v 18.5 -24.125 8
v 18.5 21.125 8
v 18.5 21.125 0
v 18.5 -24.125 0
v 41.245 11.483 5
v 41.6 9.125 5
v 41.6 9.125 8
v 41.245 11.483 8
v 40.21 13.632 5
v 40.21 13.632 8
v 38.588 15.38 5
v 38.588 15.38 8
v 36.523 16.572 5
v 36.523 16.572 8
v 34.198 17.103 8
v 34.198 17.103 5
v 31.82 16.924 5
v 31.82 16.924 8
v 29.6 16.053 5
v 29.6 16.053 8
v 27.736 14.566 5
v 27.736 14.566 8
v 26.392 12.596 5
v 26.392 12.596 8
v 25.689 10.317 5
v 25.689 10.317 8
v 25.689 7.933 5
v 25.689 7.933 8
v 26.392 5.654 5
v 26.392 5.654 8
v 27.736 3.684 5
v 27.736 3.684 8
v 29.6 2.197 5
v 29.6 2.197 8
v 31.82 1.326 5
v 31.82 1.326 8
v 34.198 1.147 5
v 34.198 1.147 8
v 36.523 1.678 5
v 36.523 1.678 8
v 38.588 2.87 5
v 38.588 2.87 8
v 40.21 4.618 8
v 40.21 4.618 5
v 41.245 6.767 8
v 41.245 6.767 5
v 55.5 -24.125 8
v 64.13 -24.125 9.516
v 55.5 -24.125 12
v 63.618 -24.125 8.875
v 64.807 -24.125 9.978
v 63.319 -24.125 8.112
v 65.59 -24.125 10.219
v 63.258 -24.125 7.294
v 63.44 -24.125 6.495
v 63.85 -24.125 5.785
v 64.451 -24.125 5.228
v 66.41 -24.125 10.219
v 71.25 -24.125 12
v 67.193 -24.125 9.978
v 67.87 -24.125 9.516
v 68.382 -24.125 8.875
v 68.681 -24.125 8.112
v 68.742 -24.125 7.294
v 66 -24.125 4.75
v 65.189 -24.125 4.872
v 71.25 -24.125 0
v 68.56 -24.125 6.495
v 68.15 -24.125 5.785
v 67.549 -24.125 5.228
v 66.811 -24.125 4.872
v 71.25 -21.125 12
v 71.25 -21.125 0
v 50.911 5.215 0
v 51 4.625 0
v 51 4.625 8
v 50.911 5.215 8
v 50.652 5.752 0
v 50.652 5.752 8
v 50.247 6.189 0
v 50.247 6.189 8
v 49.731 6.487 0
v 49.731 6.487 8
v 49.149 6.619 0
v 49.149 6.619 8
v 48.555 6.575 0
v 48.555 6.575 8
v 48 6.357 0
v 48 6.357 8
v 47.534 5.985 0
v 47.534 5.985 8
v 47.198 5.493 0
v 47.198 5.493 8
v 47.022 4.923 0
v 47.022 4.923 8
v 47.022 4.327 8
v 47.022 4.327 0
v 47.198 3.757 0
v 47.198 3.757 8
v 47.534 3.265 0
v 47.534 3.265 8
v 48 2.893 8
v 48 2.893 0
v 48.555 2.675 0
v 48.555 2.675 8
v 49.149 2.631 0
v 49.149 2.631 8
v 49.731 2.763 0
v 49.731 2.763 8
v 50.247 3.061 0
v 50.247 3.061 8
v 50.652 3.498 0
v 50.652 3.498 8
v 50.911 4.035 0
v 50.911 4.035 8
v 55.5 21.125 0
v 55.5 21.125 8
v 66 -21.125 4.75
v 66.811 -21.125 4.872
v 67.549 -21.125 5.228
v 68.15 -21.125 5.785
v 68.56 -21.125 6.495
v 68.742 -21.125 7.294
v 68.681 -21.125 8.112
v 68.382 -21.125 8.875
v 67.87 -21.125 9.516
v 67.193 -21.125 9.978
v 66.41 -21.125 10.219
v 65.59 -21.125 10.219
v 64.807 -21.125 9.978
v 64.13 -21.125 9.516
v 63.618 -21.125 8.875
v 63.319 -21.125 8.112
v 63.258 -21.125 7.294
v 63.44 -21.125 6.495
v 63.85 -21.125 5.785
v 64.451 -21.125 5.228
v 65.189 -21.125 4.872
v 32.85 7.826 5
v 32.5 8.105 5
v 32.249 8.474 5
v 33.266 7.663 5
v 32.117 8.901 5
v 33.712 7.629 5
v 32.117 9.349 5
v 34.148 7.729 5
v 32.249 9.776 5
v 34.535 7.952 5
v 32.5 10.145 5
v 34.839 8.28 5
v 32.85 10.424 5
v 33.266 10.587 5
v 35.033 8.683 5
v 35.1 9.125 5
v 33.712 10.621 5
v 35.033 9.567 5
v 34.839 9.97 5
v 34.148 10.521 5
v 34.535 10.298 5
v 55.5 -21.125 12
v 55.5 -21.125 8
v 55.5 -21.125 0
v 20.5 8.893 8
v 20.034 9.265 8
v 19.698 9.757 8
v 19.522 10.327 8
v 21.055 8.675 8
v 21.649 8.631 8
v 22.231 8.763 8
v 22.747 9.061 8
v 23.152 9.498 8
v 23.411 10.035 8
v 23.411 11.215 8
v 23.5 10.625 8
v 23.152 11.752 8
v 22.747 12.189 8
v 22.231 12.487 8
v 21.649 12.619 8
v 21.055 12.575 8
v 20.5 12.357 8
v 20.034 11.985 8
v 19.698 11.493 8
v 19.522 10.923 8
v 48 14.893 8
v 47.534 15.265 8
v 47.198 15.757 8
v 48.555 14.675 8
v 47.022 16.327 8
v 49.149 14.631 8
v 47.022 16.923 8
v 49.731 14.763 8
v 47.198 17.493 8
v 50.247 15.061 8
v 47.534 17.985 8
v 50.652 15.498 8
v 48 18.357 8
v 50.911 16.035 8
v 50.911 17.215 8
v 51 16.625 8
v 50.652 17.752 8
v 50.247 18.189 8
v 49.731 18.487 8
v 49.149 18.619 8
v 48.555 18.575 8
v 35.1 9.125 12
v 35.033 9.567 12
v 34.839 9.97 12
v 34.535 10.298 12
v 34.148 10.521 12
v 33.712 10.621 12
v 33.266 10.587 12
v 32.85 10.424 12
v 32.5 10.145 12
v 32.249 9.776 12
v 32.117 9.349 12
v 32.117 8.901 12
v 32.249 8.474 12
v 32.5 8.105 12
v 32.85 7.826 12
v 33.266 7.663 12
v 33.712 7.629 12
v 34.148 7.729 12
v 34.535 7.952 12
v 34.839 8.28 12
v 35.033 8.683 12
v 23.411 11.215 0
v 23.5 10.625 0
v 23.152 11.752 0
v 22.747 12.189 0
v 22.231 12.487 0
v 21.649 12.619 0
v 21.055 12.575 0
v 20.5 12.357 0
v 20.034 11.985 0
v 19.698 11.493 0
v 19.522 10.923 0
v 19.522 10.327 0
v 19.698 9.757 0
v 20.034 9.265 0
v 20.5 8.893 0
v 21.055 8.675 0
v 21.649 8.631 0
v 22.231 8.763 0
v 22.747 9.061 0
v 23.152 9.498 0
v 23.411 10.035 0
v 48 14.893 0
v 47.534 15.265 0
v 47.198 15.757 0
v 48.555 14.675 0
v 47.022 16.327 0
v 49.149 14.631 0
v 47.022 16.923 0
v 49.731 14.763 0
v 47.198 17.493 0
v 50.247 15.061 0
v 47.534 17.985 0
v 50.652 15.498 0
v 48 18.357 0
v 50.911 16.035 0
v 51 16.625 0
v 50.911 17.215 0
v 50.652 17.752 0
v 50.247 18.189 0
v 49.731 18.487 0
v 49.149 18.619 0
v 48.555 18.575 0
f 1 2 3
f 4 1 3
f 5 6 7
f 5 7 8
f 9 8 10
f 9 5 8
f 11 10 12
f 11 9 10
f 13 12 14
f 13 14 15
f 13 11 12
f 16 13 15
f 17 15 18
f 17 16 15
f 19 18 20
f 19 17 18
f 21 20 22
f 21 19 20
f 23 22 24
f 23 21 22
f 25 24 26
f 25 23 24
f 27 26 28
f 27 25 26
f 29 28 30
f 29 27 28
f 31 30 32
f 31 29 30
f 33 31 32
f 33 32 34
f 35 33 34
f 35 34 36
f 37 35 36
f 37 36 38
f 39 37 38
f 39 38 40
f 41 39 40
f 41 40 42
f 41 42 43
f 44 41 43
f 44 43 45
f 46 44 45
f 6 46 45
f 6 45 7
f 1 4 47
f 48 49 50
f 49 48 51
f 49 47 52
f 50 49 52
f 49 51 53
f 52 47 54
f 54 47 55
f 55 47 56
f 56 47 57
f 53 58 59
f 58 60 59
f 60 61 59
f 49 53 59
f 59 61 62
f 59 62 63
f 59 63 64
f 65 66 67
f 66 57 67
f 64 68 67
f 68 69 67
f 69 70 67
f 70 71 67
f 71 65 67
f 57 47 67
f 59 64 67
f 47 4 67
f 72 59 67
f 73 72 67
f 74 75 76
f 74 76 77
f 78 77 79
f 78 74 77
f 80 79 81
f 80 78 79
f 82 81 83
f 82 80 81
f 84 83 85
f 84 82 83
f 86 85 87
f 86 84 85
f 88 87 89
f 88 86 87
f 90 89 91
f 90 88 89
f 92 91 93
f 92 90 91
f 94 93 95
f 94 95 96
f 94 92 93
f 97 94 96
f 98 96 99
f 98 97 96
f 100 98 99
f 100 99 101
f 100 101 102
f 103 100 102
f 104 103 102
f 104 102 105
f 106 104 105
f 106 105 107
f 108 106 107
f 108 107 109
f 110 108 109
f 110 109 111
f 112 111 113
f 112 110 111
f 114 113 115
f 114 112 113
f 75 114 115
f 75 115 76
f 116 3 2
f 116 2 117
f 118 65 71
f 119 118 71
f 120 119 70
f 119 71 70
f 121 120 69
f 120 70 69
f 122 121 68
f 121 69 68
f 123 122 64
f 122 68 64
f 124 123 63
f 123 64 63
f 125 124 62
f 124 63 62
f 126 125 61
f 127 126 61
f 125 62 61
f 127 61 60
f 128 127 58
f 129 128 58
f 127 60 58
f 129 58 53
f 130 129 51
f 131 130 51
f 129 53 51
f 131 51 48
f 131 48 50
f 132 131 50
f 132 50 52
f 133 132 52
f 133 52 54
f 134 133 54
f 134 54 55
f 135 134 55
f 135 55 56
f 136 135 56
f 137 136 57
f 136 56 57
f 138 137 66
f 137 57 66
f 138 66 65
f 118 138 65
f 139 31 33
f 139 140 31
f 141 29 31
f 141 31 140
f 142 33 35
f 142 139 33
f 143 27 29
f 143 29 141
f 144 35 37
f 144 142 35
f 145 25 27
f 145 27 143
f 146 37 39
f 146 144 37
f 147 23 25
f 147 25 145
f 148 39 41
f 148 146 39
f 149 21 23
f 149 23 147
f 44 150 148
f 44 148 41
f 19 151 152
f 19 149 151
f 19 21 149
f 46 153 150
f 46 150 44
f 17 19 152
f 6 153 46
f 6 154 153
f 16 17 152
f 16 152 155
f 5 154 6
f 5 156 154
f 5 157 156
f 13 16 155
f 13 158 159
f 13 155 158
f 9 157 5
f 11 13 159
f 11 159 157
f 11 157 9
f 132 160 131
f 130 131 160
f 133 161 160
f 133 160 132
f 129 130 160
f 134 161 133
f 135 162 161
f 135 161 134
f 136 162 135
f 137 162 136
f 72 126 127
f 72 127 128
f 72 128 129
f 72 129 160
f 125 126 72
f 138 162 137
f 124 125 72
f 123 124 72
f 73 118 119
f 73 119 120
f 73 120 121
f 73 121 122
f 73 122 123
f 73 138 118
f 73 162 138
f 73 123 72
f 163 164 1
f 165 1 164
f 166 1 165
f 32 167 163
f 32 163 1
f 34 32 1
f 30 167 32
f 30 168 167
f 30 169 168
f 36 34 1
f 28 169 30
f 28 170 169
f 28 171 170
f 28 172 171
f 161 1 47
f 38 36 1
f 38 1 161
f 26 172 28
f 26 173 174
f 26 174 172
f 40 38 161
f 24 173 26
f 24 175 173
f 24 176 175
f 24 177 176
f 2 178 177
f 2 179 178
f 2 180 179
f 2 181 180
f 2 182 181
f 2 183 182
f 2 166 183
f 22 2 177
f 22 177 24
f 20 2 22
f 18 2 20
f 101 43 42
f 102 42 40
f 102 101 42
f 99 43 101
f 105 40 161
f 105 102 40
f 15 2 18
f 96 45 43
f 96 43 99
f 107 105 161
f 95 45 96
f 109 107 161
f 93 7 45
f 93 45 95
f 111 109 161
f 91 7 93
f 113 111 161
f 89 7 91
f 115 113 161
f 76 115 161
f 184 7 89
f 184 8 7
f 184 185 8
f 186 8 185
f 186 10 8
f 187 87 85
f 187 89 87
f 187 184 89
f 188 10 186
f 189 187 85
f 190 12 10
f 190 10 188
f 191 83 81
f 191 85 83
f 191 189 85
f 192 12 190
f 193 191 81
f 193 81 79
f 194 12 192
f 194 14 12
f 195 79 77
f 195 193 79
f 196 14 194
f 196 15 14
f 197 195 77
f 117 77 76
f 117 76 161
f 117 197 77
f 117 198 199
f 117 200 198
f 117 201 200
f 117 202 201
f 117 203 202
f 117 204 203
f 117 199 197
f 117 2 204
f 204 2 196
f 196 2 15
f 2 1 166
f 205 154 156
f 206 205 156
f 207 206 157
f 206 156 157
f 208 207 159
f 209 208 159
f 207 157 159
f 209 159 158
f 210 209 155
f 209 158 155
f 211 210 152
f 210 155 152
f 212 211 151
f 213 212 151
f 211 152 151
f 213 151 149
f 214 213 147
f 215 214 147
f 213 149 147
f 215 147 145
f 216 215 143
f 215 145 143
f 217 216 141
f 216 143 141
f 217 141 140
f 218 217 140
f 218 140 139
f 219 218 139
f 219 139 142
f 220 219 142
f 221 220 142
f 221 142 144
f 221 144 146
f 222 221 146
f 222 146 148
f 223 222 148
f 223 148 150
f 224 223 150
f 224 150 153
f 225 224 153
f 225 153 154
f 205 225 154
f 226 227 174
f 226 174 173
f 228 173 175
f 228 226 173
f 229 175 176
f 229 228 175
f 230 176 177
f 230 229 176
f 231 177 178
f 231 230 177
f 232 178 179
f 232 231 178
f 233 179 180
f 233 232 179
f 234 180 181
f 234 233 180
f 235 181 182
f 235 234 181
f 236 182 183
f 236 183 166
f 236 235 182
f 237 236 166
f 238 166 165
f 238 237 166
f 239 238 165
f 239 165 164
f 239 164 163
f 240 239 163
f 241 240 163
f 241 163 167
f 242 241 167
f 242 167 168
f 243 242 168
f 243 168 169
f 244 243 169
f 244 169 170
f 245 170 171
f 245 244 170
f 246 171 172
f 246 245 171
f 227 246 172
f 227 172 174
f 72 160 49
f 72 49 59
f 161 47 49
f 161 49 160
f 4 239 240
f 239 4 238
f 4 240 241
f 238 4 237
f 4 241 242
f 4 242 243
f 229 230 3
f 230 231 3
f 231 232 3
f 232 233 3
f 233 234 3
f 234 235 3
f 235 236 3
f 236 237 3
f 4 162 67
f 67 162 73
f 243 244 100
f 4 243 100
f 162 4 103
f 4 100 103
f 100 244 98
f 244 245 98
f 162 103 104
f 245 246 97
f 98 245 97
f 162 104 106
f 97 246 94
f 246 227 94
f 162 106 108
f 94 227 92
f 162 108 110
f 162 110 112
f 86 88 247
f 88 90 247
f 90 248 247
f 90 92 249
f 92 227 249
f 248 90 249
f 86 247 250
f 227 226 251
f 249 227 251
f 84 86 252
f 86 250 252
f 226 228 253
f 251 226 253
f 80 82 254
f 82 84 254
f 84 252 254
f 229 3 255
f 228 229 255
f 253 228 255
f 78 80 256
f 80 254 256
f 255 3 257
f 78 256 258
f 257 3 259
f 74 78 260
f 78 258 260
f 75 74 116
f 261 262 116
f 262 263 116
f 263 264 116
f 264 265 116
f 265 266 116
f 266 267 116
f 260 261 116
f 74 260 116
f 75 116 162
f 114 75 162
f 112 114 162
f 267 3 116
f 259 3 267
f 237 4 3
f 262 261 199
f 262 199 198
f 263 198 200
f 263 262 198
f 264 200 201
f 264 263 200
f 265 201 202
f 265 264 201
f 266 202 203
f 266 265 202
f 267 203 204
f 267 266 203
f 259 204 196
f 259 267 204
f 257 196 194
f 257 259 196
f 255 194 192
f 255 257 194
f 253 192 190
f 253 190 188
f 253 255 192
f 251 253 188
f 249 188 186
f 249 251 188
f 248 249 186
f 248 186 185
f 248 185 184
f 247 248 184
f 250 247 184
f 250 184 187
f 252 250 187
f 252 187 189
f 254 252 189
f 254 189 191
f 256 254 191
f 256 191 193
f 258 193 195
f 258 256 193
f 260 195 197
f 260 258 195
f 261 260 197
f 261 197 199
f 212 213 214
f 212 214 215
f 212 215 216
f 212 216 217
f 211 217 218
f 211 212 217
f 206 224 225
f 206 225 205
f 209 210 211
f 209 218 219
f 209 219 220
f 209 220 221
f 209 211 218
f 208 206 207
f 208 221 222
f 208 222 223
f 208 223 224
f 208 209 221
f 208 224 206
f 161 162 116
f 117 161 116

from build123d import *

# Parameters (mm, degrees)
ESQUISSE1_W             = 37
ESQUISSE1_H             = 42.25
ESQUISSE1_R             = 6
BOSS_EXTRU_1_DEPTH      = 12
ESQUISSE2_R             = 6
ESQUISSE2_R_2           = 1.5
ENL_V_MAT_EXTRU_1_DEPTH = 3
ESQUISSE3_W             = 37
ESQUISSE3_H             = 12
ESQUISSE3_W_2           = 15.75
ESQUISSE3_R             = 2.75
BOSS_EXTRU_2_DEPTH      = 3
ESQUISSE4_W             = 37
ESQUISSE4_H             = 45.25
ESQUISSE4_R             = 8
ENL_V_MAT_EXTRU_2_DEPTH = 4
ESQUISSE4_3_R           = 8
ESQUISSE4_3_R_2         = 6
ESQUISSE4_3_R_3         = 1.5
ENL_V_MAT_EXTRU_4_DEPTH = 7
CONG_2_R                = 5
CONG_3_R                = 5
ESQUISSE5_R             = 2
ENL_V_MAT_EXTRU_5_DEPTH = 43.650652105
BOSS_EXTRU_3_START      = 2
ESQUISSE2_2_R           = 1.5
BOSS_EXTRU_3_DEPTH      = 2
SYM_TRIE1_OUTLINE_W     = 37
SYM_TRIE1_OUTLINE_H     = 45.25
SYM_TRIE1_OUTLINE_R     = 8
SYM_TRIE1_OUTLINE_R_2   = 2
SYM_TRIE1_OUTLINE_R_3   = 1.5
SYM_TRIE1_DEPTH         = 8
SYM_TRIE1_2_OUTLINE_W   = 15.75
SYM_TRIE1_2_OUTLINE_H   = 3
SYM_TRIE1_2_OUTLINE_R   = 8
SYM_TRIE1_2_OUTLINE_R_2 = 1.5
SYM_TRIE1_2_DEPTH       = 4.7499999
SYM_TRIE1_START         = 10.2500001
SYM_TRIE1_3_OUTLINE_W   = 15.75
SYM_TRIE1_3_OUTLINE_H   = 3
SYM_TRIE1_3_OUTLINE_R   = 1.5
SYM_TRIE1_3_DEPTH       = 1.7499999
SYM_TRIE1_START_2       = 1.13256
SYM_TRIE1_4_OUTLINE_R   = 8
SYM_TRIE1_4_OUTLINE_R_2 = 1.5
SYM_TRIE1_4_DEPTH       = 3.86744
SYM_TRIE1_START_3       = 8
SYM_TRIE1_5_OUTLINE_R   = 1.5
SYM_TRIE1_5_DEPTH       = 2.73256
SYM_TRIE1_START_4       = -24.125
SYM_TRIE1_6_DEPTH       = 3
ESQUISSE6_W             = 14
ESQUISSE6_H             = 45.25
ENL_V_MAT_EXTRU_6_DEPTH = 60.670580063


with BuildPart() as part:
    # Esquisse1 → Boss.-Extru.1 (new body)
    # profile 1 of 2: a face of its own
    with BuildSketch(Plane.XY):
        Rectangle(ESQUISSE1_W, ESQUISSE1_H)
        with Locations((3.4, 9.125)):
            Circle(ESQUISSE1_R, mode=Mode.SUBTRACT)
    # profile 2 of 2: a face of its own
    with BuildSketch(Plane.XY):
        with Locations((3.4, 9.125)):
            Circle(ESQUISSE1_R)
    extrude(amount=BOSS_EXTRU_1_DEPTH)

    # Esquisse2 → Enlèv. mat.-Extru.1 (cut)
    with BuildSketch(Plane.XY.offset(12)):
        with Locations((3.4, 9.125)):
            Circle(ESQUISSE2_R)
        with Locations((3.4, 9.125)):
            Circle(ESQUISSE2_R_2, mode=Mode.SUBTRACT)
    extrude(amount=-ENL_V_MAT_EXTRU_1_DEPTH, mode=Mode.SUBTRACT)

    # Esquisse3 → Boss.-Extru.2 (add)
    # profile 1 of 2: a face of its own
    with BuildSketch(Plane.XZ.offset(21.125)):
        with Locations((0, 6)):
            Rectangle(ESQUISSE3_W, ESQUISSE3_H)
    # profile 2 of 2: a face of its own
    with BuildSketch(Plane.XZ.offset(21.125)):
        with Locations((-26.375, 6)):
            Rectangle(ESQUISSE3_W_2, ESQUISSE3_H)
        with Locations((-29, 7.5)):
            Circle(ESQUISSE3_R, mode=Mode.SUBTRACT)
    extrude(amount=BOSS_EXTRU_2_DEPTH)

    # Esquisse4 → Enlèv. mat.-Extru.2 (cut)
    with BuildSketch(Plane.XY.offset(12)):
        with Locations((0, -1.5)):
            Rectangle(ESQUISSE4_W, ESQUISSE4_H)
        with Locations((3.4, 9.125)):
            Circle(ESQUISSE4_R, mode=Mode.SUBTRACT)
    extrude(amount=-ENL_V_MAT_EXTRU_2_DEPTH, mode=Mode.SUBTRACT)

    # Esquisse4<3> → Enlèv. mat.-Extru.4 (cut)
    # profile 1 of 2: a face of its own
    with BuildSketch(Plane.XY.offset(12)):
        with Locations((3.4, 9.125)):
            Circle(ESQUISSE4_3_R)
        with Locations((3.4, 9.125)):
            Circle(ESQUISSE4_3_R_2, mode=Mode.SUBTRACT)
    # profile 2 of 2: a face of its own
    with BuildSketch(Plane.XY.offset(12)):
        with Locations((3.4, 9.125)):
            Circle(ESQUISSE4_3_R_2)
        with Locations((3.4, 9.125)):
            Circle(ESQUISSE4_3_R_3, mode=Mode.SUBTRACT)
    extrude(amount=-ENL_V_MAT_EXTRU_4_DEPTH, mode=Mode.SUBTRACT)

    # Congé2
    # the kernel refuses this fillet: 5 mm, written as the material it adds along each edge
    with BuildSketch(Plane(origin=(-18.5, -24.125, 8), x_dir=(1.5667467323505199e-12, 0, 1.0), z_dir=(0, 1, 0))) as cong_2_piece_1:
        with BuildLine():
            CenterArc((5, 4.898979486), CONG_2_R, 180, 78.463040967)
            Line((0, 4.898979486), (0, 0))
            Line((0, 0), (4, 0))
        make_face()
    extrude(amount=3)

    # Congé3
    cong_3_edges = [part.edges().sort_by_distance(p)[0] for p in [
        (-18.5, -22.625, 12),
    ]]
    fillet(cong_3_edges, radius=CONG_3_R)

    # Esquisse5 → Enlèv. mat.-Extru.5 (cut, through all)
    with BuildSketch(Plane.XY.offset(8)):
        with Locations((-12, 16.625)):
            Circle(ESQUISSE5_R)
        with Locations((-12, 4.625)):
            Circle(ESQUISSE5_R)
        with Locations((15.5, 10.625)):
            Circle(ESQUISSE5_R)
    extrude(amount=-ENL_V_MAT_EXTRU_5_DEPTH, mode=Mode.SUBTRACT)

    # Esquisse2<2> → Boss.-Extru.3 (add)
    with BuildSketch(Plane.XY.offset(12).offset(BOSS_EXTRU_3_START)):
        with Locations((3.4, 9.125)):
            Circle(ESQUISSE2_2_R)
    extrude(amount=-BOSS_EXTRU_3_DEPTH)

    # Symétrie1: read off the stored shape, not the designer's step
    # Symétrie1 outline → Symétrie1 (add)
    # profile 1 of 2: a face of its own
    with BuildSketch(Plane.XY):
        with Locations((37, -1.5)):
            Rectangle(SYM_TRIE1_OUTLINE_W, SYM_TRIE1_OUTLINE_H)
        with Locations((33.6, 9.125)):
            Circle(SYM_TRIE1_OUTLINE_R, mode=Mode.SUBTRACT)
        with Locations((21.5, 10.625)):
            Circle(SYM_TRIE1_OUTLINE_R_2, mode=Mode.SUBTRACT)
        with Locations((49, 4.625)):
            Circle(SYM_TRIE1_OUTLINE_R_2, mode=Mode.SUBTRACT)
        with Locations((49, 16.625)):
            Circle(SYM_TRIE1_OUTLINE_R_2, mode=Mode.SUBTRACT)
    # profile 2 of 2: a face of its own
    with BuildSketch(Plane.XY):
        with Locations((33.6, 9.125)):
            Circle(SYM_TRIE1_OUTLINE_R_3)
    extrude(amount=SYM_TRIE1_DEPTH)

    # Sym_trie1 2 outline → Sym_trie1 2 (add)
    # profile 1 of 2: a face of its own
    with BuildSketch(Plane.XY):
        with Locations((63.375, -22.625)):
            Rectangle(SYM_TRIE1_2_OUTLINE_W, SYM_TRIE1_2_OUTLINE_H)
    # profile 2 of 2: a face of its own
    with BuildSketch(Plane.XY):
        with Locations((33.6, 9.125)):
            Circle(SYM_TRIE1_2_OUTLINE_R)
        with Locations((33.6, 9.125)):
            Circle(SYM_TRIE1_2_OUTLINE_R_2, mode=Mode.SUBTRACT)
    extrude(amount=SYM_TRIE1_2_DEPTH)

    # Sym_trie1 4 outline → Sym_trie1 4 (add)
    with BuildSketch(Plane.XY.offset(SYM_TRIE1_START_2)):
        with Locations((33.6, 9.125)):
            Circle(SYM_TRIE1_4_OUTLINE_R)
        with Locations((33.6, 9.125)):
            Circle(SYM_TRIE1_4_OUTLINE_R_2, mode=Mode.SUBTRACT)
    extrude(amount=SYM_TRIE1_4_DEPTH)



with BuildPart() as body_2:
    # Sym_trie1 3 outline → Sym_trie1 3 (new body)
    with BuildSketch(Plane.XY.offset(SYM_TRIE1_START)):
        with Locations((63.375, -22.625)):
            Rectangle(SYM_TRIE1_3_OUTLINE_W, SYM_TRIE1_3_OUTLINE_H)
        with Locations((33.6, 9.125)):
            Circle(SYM_TRIE1_3_OUTLINE_R)
    extrude(amount=SYM_TRIE1_3_DEPTH)


with BuildPart() as part_1:
    add(part.part)

    add(body_2.part)  # Sym_trie1 5 merges body 2
    # Sym_trie1 5 outline → Sym_trie1 5 (add)
    with BuildSketch(Plane.XY.offset(SYM_TRIE1_START_3)):
        with Locations((33.6, 9.125)):
            Circle(SYM_TRIE1_5_OUTLINE_R)
    extrude(amount=SYM_TRIE1_5_DEPTH)

    # Sym_trie1 6 outline → Sym_trie1 6 (add)
    with BuildSketch(Plane(origin=(0, 0, 0), x_dir=(1, 0, 0), z_dir=(0, 1, 0)).offset(SYM_TRIE1_START_4)):
        with BuildLine():
            Line((66, -10.25), (71.25, -10.2500001))
            Line((71.25, -10.2500001), (71.25, -4.7499999))
            Line((71.25, -4.7499999), (66, -4.75))
            ThreePointArc((66, -4.75), (68.75, -7.5), (66, -10.25))
        make_face()
        with BuildLine():
            Line((55.5, -10.2500001), (66, -10.25))
            ThreePointArc((66, -10.25), (63.25, -7.5), (66, -4.75))
            Line((66, -4.75), (55.5, -4.7499999))
            Line((55.5, -4.7499999), (55.5, -10.2500001))
        make_face()
    extrude(amount=SYM_TRIE1_6_DEPTH)

    # Esquisse6 → Enlèv. mat.-Extru.6 (cut, through all)
    with BuildSketch(Plane(origin=(18.5, 0, 0), x_dir=(0, 0, -1), z_dir=(1, 0, 0))):
        with Locations((-7, -1.5)):
            Rectangle(ESQUISSE6_W, ESQUISSE6_H)
    extrude(amount=-ENL_V_MAT_EXTRU_6_DEPTH, mode=Mode.SUBTRACT)


solid = part_1.part
